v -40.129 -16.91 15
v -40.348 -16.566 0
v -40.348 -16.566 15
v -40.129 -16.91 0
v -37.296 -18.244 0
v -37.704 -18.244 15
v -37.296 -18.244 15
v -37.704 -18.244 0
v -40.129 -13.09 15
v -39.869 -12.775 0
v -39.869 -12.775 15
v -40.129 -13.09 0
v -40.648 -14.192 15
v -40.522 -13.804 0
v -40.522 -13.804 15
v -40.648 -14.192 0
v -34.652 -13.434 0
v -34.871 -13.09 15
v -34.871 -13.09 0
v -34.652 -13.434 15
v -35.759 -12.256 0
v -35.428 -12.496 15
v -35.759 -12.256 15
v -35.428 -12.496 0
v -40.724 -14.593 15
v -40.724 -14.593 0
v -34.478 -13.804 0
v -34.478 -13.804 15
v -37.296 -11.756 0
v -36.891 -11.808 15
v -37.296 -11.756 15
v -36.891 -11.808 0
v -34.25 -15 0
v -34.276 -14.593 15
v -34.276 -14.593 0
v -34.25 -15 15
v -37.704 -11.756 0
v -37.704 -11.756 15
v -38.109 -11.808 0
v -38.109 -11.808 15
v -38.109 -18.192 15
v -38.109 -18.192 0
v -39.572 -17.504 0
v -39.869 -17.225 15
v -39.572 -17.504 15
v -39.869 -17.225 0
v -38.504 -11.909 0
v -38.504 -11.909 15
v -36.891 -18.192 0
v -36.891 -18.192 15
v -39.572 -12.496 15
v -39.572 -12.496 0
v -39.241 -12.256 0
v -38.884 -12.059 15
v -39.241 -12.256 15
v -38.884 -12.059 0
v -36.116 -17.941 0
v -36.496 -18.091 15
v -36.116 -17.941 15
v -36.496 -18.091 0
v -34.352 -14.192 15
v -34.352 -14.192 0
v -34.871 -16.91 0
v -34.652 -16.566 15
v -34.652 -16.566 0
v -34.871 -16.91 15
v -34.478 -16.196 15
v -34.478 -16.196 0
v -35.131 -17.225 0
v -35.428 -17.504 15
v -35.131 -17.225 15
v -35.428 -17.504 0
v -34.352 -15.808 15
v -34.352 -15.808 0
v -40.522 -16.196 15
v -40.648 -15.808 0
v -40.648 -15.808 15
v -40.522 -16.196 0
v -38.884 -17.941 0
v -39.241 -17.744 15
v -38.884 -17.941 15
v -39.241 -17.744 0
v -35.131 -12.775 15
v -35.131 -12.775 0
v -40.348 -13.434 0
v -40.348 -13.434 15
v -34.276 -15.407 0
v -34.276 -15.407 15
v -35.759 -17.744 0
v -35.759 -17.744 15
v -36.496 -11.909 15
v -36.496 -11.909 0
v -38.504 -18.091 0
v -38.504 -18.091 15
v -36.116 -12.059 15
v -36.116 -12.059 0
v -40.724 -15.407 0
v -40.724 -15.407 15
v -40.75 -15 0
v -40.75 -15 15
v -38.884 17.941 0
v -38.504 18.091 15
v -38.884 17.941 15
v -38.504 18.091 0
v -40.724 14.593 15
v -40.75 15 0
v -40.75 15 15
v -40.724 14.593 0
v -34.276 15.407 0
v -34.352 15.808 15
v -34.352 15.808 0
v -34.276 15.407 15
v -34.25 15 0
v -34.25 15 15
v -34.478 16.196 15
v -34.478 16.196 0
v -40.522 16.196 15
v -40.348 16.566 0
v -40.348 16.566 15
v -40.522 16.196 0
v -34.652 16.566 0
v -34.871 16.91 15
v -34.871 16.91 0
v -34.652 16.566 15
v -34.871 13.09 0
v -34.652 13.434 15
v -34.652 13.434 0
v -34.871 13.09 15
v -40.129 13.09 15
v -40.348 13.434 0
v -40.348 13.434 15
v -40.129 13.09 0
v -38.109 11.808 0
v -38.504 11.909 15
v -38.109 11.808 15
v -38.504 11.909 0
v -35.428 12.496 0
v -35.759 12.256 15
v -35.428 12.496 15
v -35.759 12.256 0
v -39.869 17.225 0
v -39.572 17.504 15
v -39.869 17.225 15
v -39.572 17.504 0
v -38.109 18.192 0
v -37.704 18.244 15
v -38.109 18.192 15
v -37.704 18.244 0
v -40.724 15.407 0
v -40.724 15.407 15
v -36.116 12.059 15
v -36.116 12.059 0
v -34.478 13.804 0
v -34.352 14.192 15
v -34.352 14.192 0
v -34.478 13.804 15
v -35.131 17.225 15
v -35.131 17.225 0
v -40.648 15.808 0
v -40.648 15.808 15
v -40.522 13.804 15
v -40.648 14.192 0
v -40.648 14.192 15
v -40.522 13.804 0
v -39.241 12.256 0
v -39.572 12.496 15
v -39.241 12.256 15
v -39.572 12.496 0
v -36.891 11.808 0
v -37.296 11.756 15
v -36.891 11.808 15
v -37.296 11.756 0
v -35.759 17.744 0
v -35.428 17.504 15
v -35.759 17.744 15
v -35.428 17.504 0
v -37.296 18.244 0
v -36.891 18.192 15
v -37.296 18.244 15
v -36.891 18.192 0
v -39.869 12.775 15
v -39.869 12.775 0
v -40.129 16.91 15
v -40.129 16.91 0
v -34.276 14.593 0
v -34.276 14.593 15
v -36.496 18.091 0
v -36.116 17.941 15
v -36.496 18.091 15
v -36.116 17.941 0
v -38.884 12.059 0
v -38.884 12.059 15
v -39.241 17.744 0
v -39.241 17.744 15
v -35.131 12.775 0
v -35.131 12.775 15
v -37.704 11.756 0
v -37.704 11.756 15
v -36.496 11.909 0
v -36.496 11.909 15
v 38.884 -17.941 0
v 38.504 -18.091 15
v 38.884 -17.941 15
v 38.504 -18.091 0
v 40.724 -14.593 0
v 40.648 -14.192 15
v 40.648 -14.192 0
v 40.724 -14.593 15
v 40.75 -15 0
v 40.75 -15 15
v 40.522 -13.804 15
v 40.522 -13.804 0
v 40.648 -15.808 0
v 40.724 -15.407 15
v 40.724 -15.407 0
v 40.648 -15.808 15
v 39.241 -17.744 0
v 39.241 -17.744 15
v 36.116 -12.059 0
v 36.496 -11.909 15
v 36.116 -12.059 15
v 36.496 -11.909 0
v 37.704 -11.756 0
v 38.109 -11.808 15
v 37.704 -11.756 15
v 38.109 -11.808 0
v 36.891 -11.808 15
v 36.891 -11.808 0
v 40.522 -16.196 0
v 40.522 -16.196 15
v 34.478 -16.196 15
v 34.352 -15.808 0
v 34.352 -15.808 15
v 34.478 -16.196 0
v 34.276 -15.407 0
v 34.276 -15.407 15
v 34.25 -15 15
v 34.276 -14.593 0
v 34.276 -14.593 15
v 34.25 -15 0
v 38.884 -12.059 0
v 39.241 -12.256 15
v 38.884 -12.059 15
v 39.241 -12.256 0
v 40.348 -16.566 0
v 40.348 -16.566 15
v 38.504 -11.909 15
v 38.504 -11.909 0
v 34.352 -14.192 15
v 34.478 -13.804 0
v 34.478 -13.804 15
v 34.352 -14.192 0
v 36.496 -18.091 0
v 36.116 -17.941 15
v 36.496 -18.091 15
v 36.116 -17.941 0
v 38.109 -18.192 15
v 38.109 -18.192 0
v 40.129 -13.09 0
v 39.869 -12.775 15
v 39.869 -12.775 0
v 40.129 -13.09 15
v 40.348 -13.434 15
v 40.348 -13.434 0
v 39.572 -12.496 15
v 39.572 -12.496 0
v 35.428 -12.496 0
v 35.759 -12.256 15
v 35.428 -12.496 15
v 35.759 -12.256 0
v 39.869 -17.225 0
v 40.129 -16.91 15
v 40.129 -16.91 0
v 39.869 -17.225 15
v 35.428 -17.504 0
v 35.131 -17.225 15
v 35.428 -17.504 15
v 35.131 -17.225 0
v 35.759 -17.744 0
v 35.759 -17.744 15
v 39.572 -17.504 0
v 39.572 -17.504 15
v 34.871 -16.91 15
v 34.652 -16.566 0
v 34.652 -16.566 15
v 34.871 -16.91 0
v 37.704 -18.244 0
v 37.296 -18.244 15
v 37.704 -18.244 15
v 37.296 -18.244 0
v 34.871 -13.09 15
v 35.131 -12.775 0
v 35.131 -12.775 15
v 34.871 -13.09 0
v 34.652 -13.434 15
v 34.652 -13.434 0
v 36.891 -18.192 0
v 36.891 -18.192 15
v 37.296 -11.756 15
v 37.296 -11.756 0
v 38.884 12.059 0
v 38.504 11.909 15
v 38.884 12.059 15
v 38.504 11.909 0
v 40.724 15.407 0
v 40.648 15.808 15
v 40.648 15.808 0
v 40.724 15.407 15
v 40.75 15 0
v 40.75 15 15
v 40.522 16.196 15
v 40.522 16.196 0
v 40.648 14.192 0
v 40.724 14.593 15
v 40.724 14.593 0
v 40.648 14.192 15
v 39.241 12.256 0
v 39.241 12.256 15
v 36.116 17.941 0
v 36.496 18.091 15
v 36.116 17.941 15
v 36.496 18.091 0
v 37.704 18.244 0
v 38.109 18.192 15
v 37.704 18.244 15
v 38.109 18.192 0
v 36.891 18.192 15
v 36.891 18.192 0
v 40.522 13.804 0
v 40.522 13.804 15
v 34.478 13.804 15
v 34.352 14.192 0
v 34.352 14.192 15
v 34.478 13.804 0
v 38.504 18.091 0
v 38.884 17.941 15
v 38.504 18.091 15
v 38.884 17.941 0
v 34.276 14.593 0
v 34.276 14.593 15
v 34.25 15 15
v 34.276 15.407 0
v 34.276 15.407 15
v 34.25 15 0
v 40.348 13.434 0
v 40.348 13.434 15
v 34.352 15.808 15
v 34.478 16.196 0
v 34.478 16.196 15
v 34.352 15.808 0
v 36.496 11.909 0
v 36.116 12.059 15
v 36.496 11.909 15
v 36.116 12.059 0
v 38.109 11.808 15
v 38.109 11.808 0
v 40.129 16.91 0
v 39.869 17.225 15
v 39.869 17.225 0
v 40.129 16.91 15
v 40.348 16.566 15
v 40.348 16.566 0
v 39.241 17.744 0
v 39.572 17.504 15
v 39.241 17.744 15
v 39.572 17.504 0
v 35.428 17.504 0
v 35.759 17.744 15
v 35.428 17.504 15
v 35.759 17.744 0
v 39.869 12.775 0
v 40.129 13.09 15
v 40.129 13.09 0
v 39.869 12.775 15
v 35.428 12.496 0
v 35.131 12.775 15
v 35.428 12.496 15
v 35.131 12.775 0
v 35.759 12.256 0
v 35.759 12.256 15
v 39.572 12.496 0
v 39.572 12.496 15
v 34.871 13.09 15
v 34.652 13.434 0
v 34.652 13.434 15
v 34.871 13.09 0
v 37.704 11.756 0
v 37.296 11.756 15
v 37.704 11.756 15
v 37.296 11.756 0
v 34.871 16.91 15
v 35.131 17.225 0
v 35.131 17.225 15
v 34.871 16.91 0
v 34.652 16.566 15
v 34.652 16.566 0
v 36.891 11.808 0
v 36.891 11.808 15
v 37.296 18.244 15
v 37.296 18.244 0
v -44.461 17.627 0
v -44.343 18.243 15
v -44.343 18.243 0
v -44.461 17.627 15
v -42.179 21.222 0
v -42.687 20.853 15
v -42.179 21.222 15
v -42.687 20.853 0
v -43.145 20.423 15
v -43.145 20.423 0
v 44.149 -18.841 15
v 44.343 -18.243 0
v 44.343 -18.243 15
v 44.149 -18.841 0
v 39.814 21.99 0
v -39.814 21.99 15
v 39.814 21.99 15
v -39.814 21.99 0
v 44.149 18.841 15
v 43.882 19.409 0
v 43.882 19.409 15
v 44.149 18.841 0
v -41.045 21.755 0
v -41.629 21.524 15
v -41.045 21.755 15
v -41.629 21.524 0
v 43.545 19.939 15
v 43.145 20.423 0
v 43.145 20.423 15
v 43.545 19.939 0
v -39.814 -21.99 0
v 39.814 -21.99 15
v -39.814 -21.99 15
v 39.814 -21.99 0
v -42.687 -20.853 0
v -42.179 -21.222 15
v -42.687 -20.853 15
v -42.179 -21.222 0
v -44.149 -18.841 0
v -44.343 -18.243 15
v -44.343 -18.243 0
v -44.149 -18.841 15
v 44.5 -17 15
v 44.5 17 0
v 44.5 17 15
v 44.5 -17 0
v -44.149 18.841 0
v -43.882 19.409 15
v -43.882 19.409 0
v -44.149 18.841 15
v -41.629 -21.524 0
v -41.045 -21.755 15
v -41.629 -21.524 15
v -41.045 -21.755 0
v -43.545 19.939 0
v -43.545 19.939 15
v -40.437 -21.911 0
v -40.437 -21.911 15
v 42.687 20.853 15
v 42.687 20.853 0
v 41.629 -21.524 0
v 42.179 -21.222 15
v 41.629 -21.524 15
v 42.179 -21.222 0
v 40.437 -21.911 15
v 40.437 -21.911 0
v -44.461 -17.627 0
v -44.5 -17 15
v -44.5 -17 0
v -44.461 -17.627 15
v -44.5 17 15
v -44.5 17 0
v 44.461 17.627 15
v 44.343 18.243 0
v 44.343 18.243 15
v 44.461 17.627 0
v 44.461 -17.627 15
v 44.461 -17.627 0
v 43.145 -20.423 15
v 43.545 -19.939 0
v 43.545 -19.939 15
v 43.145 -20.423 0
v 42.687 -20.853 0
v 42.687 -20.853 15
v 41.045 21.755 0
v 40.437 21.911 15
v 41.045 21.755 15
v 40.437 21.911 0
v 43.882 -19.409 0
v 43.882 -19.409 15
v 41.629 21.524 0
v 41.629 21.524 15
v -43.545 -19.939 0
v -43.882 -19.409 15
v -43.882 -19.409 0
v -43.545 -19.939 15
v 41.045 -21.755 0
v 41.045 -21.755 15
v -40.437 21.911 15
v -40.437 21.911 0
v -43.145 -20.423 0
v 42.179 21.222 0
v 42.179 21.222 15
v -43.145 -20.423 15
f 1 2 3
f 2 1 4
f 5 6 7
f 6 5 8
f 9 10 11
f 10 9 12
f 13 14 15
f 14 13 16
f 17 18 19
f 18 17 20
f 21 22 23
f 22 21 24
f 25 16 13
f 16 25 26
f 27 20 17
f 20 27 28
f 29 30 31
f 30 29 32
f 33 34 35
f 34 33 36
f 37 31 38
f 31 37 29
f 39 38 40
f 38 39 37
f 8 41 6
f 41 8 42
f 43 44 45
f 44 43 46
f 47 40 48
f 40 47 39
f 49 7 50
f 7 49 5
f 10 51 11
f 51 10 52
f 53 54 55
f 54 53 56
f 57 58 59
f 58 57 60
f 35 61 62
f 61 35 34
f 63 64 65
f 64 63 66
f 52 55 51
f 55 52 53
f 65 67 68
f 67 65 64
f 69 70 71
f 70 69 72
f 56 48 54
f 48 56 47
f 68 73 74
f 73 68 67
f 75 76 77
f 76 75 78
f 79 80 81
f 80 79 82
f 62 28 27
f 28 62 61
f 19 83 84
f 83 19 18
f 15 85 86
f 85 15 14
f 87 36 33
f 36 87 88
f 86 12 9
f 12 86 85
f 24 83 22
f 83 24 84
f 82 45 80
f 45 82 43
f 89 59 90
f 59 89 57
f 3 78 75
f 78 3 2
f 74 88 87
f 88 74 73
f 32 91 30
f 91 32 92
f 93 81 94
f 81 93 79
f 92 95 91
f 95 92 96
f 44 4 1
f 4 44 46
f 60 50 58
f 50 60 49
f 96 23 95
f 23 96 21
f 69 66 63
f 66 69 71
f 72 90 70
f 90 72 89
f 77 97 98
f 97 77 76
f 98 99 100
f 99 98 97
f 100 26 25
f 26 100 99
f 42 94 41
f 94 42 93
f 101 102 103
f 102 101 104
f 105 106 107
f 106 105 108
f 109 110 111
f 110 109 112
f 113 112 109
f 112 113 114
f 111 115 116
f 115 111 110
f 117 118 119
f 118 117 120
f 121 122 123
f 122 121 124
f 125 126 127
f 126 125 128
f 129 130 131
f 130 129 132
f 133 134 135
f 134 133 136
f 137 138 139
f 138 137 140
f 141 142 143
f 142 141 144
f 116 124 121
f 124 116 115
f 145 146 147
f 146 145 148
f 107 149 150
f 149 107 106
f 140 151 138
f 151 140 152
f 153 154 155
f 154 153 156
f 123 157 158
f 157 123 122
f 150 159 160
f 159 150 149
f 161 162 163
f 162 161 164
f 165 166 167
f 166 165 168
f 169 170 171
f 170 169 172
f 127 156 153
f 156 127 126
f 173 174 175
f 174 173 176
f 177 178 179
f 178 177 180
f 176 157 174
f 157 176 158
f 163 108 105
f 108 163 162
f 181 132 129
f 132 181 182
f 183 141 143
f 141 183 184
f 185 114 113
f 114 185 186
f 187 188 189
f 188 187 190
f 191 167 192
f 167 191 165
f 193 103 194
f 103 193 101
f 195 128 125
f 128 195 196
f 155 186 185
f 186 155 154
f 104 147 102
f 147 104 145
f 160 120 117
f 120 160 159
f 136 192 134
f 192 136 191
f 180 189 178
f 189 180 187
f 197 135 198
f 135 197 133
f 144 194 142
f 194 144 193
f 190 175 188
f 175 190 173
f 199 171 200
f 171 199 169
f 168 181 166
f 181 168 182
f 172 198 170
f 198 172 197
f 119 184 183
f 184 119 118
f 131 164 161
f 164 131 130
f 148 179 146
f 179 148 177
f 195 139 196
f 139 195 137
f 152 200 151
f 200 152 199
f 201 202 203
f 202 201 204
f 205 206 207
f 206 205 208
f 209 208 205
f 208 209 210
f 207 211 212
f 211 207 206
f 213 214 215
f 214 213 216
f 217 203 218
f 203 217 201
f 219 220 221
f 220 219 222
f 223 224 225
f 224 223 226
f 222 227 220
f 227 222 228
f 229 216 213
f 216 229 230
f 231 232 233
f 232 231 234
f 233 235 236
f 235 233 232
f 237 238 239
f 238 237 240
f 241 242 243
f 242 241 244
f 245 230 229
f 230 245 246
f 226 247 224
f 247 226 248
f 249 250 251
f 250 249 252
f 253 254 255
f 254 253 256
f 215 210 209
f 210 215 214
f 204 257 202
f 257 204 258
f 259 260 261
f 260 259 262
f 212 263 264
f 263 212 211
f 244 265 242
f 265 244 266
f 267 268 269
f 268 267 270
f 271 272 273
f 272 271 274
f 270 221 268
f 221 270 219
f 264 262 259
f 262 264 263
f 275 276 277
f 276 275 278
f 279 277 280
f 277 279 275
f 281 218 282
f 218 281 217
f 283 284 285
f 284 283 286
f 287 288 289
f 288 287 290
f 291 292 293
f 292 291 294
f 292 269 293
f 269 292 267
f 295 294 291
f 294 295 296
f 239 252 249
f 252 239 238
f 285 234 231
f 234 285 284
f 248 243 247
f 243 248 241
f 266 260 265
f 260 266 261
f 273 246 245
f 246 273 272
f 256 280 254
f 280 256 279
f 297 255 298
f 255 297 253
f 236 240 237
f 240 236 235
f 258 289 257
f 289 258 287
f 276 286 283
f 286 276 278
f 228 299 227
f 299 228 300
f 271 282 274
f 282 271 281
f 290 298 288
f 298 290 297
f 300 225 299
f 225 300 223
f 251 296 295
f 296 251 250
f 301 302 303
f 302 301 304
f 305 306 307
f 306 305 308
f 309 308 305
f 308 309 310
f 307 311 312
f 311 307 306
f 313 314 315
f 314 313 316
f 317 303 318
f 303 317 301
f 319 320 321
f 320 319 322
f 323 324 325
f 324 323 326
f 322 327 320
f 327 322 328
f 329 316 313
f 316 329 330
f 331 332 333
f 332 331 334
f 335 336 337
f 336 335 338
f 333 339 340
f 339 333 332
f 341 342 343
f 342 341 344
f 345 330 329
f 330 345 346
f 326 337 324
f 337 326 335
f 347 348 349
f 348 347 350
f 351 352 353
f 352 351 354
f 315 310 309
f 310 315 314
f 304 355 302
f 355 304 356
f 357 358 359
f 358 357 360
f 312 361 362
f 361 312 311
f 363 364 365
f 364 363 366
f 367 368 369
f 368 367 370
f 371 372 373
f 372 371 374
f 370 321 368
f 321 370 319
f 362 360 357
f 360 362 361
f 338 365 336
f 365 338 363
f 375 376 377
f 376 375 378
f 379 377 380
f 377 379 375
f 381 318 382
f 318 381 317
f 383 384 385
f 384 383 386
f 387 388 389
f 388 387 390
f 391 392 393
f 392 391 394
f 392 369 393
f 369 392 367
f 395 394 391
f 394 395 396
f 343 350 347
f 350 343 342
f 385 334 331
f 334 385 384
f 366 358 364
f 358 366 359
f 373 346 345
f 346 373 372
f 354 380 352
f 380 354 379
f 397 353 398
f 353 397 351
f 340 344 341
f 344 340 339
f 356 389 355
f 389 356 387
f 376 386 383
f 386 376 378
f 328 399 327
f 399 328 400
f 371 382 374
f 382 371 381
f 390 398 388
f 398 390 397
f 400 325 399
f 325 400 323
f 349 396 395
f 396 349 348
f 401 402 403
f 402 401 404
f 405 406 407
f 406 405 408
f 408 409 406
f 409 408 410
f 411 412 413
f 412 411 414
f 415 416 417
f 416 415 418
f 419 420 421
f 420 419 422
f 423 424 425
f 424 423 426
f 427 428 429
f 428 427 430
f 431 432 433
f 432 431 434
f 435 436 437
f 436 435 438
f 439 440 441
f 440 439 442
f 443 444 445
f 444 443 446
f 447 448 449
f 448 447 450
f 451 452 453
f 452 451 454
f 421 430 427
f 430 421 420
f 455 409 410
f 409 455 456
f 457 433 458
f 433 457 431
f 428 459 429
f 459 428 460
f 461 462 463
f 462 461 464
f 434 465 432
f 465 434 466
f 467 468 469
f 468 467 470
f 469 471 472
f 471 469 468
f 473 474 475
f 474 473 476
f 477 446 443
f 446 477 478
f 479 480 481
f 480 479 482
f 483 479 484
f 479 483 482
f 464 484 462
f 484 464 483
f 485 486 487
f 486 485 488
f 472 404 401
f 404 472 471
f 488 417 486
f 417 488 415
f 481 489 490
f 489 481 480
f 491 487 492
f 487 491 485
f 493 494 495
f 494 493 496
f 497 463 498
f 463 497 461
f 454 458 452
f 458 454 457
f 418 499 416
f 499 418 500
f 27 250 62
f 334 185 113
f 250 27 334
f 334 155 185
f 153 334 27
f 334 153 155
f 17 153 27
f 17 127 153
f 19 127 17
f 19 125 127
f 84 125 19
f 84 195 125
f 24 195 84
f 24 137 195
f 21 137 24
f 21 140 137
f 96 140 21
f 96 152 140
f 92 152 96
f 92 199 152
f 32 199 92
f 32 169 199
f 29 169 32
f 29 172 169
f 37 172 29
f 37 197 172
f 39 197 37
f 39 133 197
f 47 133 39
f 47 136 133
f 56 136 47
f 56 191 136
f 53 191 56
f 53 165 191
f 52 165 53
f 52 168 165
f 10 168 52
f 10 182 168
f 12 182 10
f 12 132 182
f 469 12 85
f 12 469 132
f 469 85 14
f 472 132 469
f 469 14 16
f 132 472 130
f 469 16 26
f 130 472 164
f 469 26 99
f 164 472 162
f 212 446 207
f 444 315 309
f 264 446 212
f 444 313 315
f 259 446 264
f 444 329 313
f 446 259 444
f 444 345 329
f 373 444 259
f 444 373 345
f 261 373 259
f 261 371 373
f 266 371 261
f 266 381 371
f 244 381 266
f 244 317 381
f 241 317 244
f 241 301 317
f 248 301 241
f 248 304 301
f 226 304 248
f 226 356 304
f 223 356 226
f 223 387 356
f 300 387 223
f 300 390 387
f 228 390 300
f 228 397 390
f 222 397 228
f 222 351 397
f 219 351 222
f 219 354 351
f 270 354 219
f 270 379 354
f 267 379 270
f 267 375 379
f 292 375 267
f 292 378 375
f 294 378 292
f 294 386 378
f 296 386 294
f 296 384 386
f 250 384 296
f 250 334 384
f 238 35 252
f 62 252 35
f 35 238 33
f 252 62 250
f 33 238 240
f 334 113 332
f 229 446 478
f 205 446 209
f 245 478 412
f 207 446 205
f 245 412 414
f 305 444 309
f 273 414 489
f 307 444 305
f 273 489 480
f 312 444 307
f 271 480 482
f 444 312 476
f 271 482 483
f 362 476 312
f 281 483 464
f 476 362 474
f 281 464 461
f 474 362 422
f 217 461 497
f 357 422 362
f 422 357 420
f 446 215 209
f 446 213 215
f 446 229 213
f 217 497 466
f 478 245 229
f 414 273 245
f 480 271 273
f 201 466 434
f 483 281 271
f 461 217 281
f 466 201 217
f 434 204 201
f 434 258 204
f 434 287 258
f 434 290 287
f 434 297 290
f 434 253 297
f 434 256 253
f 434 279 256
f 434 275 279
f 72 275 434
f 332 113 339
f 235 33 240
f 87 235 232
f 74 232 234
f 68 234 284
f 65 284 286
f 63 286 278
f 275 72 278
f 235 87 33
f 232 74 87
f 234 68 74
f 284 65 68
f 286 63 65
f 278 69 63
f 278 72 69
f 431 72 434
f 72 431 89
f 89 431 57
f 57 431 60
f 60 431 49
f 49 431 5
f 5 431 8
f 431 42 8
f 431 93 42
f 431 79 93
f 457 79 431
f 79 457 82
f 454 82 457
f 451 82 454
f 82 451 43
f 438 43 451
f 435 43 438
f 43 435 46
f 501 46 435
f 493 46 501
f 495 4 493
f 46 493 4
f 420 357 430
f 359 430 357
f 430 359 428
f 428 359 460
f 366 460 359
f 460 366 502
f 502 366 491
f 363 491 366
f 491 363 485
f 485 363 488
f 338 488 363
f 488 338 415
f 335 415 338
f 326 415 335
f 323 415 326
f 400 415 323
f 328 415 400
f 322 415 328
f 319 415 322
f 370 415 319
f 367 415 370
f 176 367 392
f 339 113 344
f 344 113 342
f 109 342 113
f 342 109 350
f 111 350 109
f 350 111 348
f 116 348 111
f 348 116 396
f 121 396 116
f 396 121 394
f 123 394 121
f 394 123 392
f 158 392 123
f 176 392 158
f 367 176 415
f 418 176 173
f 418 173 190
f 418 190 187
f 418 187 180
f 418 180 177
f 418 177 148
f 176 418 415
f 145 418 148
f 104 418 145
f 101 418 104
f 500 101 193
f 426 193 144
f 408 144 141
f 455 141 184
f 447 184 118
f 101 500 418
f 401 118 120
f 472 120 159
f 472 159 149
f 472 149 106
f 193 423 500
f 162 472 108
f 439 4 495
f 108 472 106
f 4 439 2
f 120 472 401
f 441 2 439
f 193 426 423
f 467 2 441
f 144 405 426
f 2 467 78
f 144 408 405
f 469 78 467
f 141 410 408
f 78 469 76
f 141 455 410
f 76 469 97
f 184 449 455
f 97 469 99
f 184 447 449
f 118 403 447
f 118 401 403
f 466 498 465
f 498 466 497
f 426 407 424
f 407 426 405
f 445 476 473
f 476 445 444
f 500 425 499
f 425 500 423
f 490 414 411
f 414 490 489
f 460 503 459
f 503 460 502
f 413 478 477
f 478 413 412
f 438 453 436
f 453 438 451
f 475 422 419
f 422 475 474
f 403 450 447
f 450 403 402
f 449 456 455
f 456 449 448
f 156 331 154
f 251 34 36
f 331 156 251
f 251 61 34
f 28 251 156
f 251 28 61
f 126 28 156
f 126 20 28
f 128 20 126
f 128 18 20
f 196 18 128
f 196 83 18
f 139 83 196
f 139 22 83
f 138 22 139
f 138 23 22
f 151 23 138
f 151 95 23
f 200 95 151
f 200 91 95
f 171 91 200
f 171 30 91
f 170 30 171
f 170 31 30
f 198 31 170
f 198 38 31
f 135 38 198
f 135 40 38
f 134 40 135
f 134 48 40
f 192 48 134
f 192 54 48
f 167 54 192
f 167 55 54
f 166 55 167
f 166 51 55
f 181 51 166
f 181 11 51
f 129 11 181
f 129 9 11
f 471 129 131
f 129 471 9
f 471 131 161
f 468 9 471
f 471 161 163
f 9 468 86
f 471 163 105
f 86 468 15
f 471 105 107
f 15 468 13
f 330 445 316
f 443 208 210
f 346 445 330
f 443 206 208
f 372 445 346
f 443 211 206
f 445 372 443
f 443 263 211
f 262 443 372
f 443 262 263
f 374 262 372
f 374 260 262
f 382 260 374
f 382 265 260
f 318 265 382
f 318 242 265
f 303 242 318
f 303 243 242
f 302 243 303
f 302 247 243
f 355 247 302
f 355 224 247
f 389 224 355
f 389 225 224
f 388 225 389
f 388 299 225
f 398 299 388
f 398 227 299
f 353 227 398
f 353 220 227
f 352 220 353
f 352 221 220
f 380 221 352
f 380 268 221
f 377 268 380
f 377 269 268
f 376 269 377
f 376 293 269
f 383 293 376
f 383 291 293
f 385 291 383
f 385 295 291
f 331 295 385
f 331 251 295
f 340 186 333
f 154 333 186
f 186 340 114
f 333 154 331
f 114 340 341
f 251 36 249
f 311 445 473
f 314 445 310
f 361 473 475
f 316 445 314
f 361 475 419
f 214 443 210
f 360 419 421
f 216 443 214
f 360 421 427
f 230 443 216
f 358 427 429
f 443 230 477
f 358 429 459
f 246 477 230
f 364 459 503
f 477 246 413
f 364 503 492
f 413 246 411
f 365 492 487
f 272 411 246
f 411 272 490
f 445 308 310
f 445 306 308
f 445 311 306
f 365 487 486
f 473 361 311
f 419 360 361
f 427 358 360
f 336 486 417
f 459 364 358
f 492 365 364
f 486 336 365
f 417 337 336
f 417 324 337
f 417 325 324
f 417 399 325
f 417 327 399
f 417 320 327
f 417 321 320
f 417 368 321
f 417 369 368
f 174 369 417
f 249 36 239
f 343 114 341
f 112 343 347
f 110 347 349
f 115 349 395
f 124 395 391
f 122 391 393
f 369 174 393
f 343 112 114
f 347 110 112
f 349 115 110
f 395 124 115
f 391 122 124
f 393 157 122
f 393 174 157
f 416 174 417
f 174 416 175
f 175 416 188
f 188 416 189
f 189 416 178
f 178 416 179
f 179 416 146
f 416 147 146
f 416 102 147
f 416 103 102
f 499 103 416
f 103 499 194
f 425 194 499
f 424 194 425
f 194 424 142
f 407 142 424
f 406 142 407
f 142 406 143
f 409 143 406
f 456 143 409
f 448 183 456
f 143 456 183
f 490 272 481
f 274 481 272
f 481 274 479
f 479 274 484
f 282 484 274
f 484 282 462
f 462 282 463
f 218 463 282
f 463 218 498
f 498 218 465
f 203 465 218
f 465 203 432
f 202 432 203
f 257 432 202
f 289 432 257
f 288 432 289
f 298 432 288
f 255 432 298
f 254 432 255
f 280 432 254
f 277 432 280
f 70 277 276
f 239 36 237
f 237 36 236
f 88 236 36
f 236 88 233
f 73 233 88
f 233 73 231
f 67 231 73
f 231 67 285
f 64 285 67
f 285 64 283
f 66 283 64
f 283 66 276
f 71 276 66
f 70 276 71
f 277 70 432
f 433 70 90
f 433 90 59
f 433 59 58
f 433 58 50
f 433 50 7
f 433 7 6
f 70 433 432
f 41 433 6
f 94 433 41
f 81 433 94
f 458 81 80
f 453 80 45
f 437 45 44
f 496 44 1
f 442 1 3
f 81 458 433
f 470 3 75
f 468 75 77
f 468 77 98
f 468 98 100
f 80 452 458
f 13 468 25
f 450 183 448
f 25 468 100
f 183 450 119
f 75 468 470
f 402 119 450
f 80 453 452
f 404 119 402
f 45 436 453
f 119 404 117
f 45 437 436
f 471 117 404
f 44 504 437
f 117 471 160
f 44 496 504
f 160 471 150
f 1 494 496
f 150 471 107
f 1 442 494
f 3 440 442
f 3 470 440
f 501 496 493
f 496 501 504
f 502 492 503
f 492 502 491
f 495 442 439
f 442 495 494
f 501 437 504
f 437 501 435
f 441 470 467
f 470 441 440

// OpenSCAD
$fn = 50;


difference() {
	union() {
		hull() {
			translate(v = [-39.5000000000, 17.0000000000, 0]) {
				cylinder(h = 15, r = 5);
			}
			translate(v = [39.5000000000, 17.0000000000, 0]) {
				cylinder(h = 15, r = 5);
			}
			translate(v = [-39.5000000000, -17.0000000000, 0]) {
				cylinder(h = 15, r = 5);
			}
			translate(v = [39.5000000000, -17.0000000000, 0]) {
				cylinder(h = 15, r = 5);
			}
		}
	}
	union() {
		translate(v = [-37.5000000000, -15.0000000000, -100.0000000000]) {
			cylinder(h = 200, r = 3.2500000000);
		}
		translate(v = [-37.5000000000, 15.0000000000, -100.0000000000]) {
			cylinder(h = 200, r = 3.2500000000);
		}
		translate(v = [37.5000000000, -15.0000000000, -100.0000000000]) {
			cylinder(h = 200, r = 3.2500000000);
		}
		translate(v = [37.5000000000, 15.0000000000, -100.0000000000]) {
			cylinder(h = 200, r = 3.2500000000);
		}
	}
}
